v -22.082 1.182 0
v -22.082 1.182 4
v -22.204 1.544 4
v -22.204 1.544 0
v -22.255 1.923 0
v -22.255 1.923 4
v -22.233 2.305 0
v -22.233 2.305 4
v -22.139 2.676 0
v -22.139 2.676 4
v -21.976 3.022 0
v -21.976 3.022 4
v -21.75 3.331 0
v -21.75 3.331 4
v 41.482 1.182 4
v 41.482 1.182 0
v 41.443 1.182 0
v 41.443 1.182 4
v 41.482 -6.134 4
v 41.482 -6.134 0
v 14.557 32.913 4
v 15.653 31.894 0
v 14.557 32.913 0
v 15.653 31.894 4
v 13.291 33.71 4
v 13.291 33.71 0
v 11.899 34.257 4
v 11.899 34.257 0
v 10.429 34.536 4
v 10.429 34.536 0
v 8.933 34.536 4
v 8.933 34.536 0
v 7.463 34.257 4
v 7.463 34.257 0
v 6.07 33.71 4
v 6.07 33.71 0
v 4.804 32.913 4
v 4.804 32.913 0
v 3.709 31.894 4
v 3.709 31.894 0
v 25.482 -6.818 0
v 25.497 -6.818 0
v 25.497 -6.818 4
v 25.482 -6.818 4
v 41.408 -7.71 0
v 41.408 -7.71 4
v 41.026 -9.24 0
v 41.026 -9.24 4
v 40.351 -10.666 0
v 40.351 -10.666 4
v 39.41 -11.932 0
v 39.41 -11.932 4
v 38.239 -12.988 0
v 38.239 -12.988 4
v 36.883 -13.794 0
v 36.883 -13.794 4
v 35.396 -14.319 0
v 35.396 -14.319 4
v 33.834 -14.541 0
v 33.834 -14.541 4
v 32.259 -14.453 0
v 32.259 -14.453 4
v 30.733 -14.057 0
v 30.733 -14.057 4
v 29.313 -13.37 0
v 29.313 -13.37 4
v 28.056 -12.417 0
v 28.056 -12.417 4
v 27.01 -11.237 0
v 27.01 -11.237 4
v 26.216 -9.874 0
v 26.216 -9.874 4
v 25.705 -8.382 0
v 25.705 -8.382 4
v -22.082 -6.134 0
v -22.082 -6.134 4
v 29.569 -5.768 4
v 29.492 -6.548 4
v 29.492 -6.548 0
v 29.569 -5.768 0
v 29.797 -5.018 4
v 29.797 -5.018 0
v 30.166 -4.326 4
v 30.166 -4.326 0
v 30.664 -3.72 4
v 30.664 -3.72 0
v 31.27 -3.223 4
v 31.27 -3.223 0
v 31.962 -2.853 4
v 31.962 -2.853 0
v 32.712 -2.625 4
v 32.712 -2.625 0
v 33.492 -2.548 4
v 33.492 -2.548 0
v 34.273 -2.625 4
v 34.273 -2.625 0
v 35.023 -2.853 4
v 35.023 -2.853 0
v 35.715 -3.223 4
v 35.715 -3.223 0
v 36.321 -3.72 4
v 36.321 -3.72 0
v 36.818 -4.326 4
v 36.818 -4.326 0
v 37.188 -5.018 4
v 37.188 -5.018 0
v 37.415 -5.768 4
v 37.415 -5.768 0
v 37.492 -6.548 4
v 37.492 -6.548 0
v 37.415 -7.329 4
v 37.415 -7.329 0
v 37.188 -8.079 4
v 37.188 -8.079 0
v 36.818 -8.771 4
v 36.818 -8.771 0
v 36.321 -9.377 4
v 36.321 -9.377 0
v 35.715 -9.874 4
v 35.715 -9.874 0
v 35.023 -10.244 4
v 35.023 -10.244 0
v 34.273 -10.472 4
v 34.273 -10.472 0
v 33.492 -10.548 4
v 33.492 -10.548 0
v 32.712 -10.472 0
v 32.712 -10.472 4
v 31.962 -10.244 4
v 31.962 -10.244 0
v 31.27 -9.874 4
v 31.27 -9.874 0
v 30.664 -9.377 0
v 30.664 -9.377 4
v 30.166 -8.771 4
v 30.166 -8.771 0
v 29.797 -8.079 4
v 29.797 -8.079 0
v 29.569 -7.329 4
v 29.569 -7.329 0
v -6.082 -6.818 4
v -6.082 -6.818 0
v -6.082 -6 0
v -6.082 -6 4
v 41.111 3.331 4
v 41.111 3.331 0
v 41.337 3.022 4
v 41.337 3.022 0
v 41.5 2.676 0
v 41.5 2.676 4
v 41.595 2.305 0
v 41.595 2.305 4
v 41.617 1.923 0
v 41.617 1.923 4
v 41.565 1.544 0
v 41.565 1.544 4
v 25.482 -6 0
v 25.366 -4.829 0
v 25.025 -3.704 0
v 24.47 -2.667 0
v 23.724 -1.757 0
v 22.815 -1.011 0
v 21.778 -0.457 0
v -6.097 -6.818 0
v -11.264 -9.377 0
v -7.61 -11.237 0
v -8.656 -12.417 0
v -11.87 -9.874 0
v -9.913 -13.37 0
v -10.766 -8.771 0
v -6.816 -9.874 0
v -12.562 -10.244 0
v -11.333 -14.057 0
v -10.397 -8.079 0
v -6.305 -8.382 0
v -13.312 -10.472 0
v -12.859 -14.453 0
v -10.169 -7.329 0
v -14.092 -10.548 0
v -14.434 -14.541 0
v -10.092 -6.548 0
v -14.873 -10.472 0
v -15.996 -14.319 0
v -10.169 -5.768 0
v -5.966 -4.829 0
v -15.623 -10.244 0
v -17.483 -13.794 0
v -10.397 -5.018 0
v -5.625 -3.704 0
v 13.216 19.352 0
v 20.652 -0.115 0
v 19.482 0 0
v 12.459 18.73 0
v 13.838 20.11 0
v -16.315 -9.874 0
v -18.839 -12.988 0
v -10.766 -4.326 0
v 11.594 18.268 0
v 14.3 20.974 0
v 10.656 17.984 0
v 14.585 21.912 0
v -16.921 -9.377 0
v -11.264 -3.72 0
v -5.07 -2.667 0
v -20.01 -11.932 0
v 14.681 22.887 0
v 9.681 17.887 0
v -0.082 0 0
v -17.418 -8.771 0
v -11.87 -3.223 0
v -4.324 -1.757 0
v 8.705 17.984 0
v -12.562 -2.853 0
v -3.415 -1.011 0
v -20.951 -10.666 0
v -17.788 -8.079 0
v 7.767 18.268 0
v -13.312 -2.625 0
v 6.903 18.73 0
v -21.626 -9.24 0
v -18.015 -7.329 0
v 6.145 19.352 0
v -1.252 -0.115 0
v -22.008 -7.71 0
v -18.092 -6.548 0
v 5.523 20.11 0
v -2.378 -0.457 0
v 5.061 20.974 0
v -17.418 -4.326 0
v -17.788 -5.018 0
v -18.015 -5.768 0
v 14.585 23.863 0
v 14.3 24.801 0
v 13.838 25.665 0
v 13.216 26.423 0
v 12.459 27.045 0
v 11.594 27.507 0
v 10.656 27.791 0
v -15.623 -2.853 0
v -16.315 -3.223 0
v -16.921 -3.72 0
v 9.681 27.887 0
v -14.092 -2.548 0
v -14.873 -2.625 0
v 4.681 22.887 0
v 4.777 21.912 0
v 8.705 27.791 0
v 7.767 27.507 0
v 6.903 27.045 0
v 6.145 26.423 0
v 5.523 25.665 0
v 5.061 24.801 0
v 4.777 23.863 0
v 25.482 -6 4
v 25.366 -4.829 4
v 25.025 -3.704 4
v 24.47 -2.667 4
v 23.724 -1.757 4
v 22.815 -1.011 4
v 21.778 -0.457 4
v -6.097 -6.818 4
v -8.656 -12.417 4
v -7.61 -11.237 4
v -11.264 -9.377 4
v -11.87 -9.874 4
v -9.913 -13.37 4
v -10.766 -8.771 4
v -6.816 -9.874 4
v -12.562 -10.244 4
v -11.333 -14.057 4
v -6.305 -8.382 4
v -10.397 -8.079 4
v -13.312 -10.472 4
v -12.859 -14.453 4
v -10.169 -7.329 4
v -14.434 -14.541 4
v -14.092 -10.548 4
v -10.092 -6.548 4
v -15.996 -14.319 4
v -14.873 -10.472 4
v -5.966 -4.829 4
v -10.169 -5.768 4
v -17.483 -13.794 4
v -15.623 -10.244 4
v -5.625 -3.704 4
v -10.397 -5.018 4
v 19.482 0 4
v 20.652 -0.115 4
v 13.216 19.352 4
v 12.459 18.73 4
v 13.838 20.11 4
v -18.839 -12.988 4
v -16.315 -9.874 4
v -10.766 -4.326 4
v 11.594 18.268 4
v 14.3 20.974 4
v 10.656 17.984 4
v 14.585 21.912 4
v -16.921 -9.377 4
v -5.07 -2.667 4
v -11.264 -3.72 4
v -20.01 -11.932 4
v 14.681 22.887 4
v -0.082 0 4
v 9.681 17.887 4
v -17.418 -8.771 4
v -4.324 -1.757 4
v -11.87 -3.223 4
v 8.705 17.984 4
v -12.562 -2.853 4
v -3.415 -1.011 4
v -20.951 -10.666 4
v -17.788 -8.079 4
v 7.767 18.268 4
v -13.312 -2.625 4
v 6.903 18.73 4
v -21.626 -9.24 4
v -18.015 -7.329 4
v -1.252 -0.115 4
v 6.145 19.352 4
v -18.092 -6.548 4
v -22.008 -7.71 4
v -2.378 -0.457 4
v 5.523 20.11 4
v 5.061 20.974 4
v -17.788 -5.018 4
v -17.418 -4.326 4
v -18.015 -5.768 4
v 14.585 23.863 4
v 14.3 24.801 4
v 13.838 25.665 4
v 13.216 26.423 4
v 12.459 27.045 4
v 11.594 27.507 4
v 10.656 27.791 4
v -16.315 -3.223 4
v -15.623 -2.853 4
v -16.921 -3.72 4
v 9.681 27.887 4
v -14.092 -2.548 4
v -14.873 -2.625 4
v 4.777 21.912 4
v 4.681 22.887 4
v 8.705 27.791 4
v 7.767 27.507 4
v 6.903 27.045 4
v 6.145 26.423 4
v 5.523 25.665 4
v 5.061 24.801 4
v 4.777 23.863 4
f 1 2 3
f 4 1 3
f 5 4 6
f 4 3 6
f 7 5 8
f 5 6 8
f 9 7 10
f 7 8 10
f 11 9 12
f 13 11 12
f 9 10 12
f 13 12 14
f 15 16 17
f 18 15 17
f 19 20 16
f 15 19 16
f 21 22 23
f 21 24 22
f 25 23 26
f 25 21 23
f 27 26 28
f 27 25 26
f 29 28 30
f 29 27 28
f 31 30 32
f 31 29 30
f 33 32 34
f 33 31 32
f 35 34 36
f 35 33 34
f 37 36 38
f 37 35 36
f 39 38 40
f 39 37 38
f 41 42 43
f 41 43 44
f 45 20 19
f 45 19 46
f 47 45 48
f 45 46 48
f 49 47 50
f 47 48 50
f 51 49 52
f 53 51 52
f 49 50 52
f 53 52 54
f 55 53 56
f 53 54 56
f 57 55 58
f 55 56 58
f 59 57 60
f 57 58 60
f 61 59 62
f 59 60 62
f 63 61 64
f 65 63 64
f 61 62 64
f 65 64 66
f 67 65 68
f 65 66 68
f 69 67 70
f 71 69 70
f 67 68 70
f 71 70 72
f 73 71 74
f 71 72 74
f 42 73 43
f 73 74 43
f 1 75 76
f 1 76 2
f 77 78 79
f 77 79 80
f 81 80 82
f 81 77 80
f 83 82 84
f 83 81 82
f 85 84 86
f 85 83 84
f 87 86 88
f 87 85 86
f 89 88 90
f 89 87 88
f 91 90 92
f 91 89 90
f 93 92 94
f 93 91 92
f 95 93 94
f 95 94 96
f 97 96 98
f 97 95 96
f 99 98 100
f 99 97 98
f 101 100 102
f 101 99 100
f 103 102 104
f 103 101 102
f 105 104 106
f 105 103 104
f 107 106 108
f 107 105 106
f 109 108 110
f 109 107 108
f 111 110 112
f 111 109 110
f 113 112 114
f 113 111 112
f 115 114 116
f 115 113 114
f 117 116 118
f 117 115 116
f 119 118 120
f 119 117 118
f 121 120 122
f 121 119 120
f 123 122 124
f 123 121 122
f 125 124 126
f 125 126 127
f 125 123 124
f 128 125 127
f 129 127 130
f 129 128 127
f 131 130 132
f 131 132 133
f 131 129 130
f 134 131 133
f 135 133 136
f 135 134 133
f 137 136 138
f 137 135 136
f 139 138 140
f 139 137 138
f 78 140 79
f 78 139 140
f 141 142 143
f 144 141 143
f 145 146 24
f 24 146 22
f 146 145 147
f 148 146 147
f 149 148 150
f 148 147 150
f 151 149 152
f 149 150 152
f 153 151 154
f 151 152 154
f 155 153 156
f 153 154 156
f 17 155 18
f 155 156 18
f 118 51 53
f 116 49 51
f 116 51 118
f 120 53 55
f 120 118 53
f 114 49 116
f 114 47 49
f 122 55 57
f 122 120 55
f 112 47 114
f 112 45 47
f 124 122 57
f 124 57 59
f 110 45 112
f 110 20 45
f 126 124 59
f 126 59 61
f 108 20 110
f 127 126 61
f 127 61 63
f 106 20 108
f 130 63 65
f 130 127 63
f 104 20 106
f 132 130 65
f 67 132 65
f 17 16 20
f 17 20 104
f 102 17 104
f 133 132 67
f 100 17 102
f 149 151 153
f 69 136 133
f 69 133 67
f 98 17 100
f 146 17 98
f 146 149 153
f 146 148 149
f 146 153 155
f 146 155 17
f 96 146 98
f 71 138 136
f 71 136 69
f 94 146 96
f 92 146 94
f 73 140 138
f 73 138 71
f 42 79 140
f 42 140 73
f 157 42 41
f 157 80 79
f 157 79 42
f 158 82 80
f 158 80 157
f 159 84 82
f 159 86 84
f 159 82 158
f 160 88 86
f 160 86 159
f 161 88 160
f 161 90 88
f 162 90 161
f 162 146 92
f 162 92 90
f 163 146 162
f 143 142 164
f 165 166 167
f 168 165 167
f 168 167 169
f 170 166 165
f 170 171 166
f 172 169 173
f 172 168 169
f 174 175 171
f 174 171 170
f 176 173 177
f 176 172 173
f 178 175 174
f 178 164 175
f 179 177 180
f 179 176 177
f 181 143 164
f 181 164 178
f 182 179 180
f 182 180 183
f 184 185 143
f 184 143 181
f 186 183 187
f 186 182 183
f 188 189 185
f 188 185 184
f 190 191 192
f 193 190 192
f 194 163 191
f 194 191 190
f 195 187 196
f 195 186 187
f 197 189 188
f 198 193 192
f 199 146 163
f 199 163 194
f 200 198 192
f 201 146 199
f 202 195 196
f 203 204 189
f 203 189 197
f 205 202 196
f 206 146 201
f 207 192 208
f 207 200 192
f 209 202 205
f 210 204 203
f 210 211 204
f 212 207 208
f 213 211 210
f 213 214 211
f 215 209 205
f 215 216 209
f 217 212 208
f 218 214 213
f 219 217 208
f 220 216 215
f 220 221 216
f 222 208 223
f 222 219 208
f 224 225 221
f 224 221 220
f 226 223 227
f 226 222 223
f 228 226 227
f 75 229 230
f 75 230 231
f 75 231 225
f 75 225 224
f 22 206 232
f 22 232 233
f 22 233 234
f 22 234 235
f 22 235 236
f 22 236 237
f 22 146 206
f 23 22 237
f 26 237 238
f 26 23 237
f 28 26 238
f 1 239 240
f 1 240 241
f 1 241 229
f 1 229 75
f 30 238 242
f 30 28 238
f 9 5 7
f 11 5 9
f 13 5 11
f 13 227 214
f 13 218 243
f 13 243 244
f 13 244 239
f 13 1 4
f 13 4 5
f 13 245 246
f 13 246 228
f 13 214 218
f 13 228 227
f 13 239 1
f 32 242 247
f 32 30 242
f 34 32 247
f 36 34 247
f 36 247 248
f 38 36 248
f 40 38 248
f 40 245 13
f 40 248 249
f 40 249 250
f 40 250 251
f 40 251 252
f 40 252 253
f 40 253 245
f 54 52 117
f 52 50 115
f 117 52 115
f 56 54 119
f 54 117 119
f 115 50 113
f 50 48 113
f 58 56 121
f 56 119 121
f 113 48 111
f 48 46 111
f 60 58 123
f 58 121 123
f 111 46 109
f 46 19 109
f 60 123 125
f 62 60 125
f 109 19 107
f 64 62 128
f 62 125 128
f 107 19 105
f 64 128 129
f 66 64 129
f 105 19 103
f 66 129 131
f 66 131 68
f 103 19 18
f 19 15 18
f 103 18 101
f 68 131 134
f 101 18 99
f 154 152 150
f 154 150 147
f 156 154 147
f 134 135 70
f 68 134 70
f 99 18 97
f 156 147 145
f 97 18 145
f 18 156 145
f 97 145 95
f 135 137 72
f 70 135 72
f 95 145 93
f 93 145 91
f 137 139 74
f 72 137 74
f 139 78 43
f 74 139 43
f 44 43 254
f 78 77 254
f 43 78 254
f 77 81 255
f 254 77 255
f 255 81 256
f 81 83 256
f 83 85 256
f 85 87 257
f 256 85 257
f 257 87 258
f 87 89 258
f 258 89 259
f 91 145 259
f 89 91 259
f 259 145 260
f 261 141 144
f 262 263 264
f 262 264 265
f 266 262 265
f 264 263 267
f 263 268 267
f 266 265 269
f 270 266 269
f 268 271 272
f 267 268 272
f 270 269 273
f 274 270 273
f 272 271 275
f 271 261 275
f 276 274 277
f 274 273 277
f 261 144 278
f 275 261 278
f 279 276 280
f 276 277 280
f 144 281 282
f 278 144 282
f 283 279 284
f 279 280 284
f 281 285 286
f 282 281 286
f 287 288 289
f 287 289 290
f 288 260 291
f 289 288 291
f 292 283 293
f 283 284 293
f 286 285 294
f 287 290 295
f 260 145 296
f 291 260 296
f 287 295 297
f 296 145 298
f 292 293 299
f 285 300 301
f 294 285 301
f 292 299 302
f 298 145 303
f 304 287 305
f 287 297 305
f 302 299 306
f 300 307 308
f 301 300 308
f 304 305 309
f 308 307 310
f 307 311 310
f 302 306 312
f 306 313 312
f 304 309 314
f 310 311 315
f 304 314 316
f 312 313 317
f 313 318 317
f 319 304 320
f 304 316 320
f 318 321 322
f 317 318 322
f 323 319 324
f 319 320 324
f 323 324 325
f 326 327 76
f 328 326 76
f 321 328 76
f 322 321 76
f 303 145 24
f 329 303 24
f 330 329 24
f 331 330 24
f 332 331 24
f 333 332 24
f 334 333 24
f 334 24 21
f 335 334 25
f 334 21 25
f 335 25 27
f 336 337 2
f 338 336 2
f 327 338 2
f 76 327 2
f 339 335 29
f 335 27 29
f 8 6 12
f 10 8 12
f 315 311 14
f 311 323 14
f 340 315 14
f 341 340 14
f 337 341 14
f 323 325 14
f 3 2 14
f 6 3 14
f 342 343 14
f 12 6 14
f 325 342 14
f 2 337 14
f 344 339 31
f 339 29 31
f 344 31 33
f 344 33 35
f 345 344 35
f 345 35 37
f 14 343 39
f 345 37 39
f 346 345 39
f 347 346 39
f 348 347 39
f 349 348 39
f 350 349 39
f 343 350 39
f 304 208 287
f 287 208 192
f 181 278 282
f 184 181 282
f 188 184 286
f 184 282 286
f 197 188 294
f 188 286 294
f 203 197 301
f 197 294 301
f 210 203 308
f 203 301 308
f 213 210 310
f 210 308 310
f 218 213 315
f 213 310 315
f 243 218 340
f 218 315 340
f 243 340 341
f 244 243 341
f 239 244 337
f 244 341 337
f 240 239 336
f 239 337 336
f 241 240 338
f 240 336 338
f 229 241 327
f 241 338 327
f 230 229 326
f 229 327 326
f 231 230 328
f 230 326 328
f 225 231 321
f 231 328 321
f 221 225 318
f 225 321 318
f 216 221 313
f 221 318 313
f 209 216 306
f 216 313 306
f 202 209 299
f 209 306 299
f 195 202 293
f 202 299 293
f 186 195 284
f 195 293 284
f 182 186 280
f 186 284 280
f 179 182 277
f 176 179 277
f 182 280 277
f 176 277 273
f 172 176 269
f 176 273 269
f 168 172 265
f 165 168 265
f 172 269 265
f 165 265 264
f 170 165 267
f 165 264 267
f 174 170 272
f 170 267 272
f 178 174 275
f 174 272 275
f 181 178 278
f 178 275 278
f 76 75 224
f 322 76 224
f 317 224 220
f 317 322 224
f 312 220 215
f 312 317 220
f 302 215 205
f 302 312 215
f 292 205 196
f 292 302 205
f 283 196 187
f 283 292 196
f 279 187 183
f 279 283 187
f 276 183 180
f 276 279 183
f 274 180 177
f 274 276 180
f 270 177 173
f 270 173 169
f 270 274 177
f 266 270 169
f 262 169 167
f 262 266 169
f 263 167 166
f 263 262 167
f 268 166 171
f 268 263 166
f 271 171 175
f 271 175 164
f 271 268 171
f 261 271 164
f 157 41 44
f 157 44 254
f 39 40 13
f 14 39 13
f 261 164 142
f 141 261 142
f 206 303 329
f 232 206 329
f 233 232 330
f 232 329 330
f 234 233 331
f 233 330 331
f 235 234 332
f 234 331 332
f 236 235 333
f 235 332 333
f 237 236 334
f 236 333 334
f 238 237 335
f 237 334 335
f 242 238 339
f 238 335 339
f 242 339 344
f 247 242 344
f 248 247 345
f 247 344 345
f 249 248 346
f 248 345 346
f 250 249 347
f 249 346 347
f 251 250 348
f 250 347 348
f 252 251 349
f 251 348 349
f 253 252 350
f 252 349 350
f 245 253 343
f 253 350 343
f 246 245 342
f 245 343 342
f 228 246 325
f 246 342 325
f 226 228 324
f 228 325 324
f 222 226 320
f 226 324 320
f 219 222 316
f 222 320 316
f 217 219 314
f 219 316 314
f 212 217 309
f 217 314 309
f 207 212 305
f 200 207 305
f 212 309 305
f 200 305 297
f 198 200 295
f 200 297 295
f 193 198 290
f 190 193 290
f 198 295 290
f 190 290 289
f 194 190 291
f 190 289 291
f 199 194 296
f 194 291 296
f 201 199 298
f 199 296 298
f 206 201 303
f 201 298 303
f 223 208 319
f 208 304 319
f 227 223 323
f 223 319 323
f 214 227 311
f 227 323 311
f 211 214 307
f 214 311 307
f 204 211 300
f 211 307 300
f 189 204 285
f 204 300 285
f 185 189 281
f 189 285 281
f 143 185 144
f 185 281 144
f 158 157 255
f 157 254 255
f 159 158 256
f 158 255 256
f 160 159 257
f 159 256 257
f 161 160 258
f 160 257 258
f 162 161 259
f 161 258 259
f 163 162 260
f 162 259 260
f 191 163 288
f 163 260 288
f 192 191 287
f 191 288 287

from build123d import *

# Parameters (mm, degrees)
BOSS_EXTRUDE1_DEPTH  = 4
FILLET1_R            = 8
FILLET2_R            = 2
SKETCH8_R            = 5
CUT_EXTRUDE1_DEPTH   = 4
SKETCH3_W            = 16
SKETCH3_H            = 8
BOSS_EXTRUDE2_DEPTH  = 4
SKETCH10_R           = 8
BOSS_EXTRUDE3_DEPTH  = 4
FILLET3_R            = 6
SKETCH11_R           = 4
CUT_EXTRUDE2_DEPTH   = 4
FILLET3_OF_MIRROR1_R = 6


with BuildPart() as part:
    # Sketch2 → Boss-Extrude1 (new body)
    with BuildSketch(Plane.XY):
        Polygon((-24.718317205, 0), (44.079761222, 0), (9.680722008, 38.594041061), align=None)
    extrude(amount=BOSS_EXTRUDE1_DEPTH)

    # Fillet1
    fillet1_edges = [part.edges().sort_by_distance(p)[0] for p in [
        (9.680722008, 38.594041061, 2),
    ]]
    fillet(fillet1_edges, radius=FILLET1_R)

    # Fillet2
    fillet2_edges = [part.edges().sort_by_distance(p)[0] for p in [
        (44.079761222, 0, 2),
        (-24.718317205, 0, 2),
    ]]
    fillet(fillet2_edges, radius=FILLET2_R)

    # Sketch8 → Cut-Extrude1 (cut)
    with BuildSketch(Plane.XY.offset(4)):
        with Locations((9.680722008, 22.887439188)):
            Circle(SKETCH8_R)
    extrude(amount=-CUT_EXTRUDE1_DEPTH, mode=Mode.SUBTRACT)

    # Sketch3 → Boss-Extrude2 (add)
    with BuildSketch(Plane.XY):
        with Locations((-14.081618267, -2.818082449)):
            Rectangle(SKETCH3_W, SKETCH3_H)
    boss_extrude2 = extrude(amount=BOSS_EXTRUDE2_DEPTH)

    # Sketch10 → Boss-Extrude3 (add)
    with BuildSketch(Plane.XY.offset(4)):
        with Locations((-14.092338513, -6.548407243)):
            Circle(SKETCH10_R)
    boss_extrude3 = extrude(amount=-BOSS_EXTRUDE3_DEPTH)

    # Fillet3
    fillet3_edges = [part.edges().sort_by_distance(p)[0] for p in [
        (-6.081618267, 0, 2),
    ]]
    fillet(fillet3_edges, radius=FILLET3_R)

    # Sketch11 → Cut-Extrude2 (cut)
    with BuildSketch(Plane.XY.offset(4)):
        with Locations((-14.092338513, -6.548407243)):
            Circle(SKETCH11_R)
    cut_extrude2 = extrude(amount=-CUT_EXTRUDE2_DEPTH, mode=Mode.SUBTRACT)

    # Mirror1: Boss-Extrude2, Boss-Extrude3, Cut-Extrude2 across plane
    add(boss_extrude2.mirror(Plane(origin=(9.7, 0, 0), x_dir=(0, 0, 1), z_dir=(1, 0, 0))))
    add(boss_extrude3.mirror(Plane(origin=(9.7, 0, 0), x_dir=(0, 0, 1), z_dir=(1, 0, 0))))
    add(cut_extrude2.mirror(Plane(origin=(9.7, 0, 0), x_dir=(0, 0, 1), z_dir=(1, 0, 0))), mode=Mode.SUBTRACT)

    # Fillet3 of Mirror1
    fillet3_of_mirror1_edges = [part.edges().sort_by_distance(p)[0] for p in [
        (25.481618267, 0, 2),
    ]]
    fillet(fillet3_of_mirror1_edges, radius=FILLET3_OF_MIRROR1_R)


solid = part.part
